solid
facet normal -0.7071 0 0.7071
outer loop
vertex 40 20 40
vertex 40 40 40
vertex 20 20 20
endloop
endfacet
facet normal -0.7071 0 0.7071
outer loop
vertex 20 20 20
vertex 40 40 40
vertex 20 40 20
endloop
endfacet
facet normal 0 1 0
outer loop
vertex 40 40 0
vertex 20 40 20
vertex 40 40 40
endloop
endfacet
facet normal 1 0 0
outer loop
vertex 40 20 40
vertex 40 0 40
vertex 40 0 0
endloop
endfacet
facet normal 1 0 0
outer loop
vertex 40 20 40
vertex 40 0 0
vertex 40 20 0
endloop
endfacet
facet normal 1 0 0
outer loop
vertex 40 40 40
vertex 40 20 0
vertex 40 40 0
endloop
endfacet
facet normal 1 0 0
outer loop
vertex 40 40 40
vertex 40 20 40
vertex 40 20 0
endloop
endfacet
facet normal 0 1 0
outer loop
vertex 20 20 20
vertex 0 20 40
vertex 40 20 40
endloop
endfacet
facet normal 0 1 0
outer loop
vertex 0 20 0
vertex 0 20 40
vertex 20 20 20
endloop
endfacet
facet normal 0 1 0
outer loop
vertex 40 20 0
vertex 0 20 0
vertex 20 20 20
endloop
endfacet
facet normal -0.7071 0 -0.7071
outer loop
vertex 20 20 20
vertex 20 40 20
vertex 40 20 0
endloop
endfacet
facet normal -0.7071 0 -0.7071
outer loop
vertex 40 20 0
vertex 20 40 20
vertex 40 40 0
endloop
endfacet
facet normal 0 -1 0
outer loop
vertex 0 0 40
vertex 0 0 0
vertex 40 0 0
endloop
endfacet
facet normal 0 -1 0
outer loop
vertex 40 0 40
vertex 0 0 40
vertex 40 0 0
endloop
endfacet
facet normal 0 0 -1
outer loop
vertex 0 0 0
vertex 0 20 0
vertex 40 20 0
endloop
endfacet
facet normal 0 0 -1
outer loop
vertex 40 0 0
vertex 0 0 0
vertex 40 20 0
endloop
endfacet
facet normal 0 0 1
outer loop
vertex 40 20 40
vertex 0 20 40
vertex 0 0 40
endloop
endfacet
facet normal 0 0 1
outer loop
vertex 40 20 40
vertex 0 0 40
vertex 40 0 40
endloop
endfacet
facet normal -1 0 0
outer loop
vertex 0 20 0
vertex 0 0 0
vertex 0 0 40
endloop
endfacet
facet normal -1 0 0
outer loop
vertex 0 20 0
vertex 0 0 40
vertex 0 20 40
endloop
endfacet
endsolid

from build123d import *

# Parameters (mm, degrees)
SKETCH1_W           = 40
SKETCH1_H           = 20
BOSS_EXTRUDE1_DEPTH = 40
SKETCH2_W           = 20
SKETCH2_H           = 20
BOSS_EXTRUDE2_DEPTH = 40
CUT_EXTRUDE1_DEPTH  = 20


with BuildPart() as part:
    # Sketch1 → Boss-Extrude1 (new body)
    with BuildSketch(Plane.XY):
        with Locations((20, 10)):
            Rectangle(SKETCH1_W, SKETCH1_H)
    extrude(amount=BOSS_EXTRUDE1_DEPTH)

    # Sketch2 → Boss-Extrude2 (add)
    with BuildSketch(Plane.XY.offset(40)):
        with Locations((30, 30)):
            Rectangle(SKETCH2_W, SKETCH2_H)
    extrude(amount=-BOSS_EXTRUDE2_DEPTH)

    # Sketch3 → Cut-Extrude1 (cut)
    with BuildSketch(Plane(origin=(0, 40, 0), x_dir=(1, 0, 0), z_dir=(0, 1, 0))):
        Polygon((20, 0), (20, -20), (40, 0), align=None)
        Polygon((40, -40), (20, -20), (20, -40), align=None)
    extrude(amount=-CUT_EXTRUDE1_DEPTH, mode=Mode.SUBTRACT)


solid = part.part
